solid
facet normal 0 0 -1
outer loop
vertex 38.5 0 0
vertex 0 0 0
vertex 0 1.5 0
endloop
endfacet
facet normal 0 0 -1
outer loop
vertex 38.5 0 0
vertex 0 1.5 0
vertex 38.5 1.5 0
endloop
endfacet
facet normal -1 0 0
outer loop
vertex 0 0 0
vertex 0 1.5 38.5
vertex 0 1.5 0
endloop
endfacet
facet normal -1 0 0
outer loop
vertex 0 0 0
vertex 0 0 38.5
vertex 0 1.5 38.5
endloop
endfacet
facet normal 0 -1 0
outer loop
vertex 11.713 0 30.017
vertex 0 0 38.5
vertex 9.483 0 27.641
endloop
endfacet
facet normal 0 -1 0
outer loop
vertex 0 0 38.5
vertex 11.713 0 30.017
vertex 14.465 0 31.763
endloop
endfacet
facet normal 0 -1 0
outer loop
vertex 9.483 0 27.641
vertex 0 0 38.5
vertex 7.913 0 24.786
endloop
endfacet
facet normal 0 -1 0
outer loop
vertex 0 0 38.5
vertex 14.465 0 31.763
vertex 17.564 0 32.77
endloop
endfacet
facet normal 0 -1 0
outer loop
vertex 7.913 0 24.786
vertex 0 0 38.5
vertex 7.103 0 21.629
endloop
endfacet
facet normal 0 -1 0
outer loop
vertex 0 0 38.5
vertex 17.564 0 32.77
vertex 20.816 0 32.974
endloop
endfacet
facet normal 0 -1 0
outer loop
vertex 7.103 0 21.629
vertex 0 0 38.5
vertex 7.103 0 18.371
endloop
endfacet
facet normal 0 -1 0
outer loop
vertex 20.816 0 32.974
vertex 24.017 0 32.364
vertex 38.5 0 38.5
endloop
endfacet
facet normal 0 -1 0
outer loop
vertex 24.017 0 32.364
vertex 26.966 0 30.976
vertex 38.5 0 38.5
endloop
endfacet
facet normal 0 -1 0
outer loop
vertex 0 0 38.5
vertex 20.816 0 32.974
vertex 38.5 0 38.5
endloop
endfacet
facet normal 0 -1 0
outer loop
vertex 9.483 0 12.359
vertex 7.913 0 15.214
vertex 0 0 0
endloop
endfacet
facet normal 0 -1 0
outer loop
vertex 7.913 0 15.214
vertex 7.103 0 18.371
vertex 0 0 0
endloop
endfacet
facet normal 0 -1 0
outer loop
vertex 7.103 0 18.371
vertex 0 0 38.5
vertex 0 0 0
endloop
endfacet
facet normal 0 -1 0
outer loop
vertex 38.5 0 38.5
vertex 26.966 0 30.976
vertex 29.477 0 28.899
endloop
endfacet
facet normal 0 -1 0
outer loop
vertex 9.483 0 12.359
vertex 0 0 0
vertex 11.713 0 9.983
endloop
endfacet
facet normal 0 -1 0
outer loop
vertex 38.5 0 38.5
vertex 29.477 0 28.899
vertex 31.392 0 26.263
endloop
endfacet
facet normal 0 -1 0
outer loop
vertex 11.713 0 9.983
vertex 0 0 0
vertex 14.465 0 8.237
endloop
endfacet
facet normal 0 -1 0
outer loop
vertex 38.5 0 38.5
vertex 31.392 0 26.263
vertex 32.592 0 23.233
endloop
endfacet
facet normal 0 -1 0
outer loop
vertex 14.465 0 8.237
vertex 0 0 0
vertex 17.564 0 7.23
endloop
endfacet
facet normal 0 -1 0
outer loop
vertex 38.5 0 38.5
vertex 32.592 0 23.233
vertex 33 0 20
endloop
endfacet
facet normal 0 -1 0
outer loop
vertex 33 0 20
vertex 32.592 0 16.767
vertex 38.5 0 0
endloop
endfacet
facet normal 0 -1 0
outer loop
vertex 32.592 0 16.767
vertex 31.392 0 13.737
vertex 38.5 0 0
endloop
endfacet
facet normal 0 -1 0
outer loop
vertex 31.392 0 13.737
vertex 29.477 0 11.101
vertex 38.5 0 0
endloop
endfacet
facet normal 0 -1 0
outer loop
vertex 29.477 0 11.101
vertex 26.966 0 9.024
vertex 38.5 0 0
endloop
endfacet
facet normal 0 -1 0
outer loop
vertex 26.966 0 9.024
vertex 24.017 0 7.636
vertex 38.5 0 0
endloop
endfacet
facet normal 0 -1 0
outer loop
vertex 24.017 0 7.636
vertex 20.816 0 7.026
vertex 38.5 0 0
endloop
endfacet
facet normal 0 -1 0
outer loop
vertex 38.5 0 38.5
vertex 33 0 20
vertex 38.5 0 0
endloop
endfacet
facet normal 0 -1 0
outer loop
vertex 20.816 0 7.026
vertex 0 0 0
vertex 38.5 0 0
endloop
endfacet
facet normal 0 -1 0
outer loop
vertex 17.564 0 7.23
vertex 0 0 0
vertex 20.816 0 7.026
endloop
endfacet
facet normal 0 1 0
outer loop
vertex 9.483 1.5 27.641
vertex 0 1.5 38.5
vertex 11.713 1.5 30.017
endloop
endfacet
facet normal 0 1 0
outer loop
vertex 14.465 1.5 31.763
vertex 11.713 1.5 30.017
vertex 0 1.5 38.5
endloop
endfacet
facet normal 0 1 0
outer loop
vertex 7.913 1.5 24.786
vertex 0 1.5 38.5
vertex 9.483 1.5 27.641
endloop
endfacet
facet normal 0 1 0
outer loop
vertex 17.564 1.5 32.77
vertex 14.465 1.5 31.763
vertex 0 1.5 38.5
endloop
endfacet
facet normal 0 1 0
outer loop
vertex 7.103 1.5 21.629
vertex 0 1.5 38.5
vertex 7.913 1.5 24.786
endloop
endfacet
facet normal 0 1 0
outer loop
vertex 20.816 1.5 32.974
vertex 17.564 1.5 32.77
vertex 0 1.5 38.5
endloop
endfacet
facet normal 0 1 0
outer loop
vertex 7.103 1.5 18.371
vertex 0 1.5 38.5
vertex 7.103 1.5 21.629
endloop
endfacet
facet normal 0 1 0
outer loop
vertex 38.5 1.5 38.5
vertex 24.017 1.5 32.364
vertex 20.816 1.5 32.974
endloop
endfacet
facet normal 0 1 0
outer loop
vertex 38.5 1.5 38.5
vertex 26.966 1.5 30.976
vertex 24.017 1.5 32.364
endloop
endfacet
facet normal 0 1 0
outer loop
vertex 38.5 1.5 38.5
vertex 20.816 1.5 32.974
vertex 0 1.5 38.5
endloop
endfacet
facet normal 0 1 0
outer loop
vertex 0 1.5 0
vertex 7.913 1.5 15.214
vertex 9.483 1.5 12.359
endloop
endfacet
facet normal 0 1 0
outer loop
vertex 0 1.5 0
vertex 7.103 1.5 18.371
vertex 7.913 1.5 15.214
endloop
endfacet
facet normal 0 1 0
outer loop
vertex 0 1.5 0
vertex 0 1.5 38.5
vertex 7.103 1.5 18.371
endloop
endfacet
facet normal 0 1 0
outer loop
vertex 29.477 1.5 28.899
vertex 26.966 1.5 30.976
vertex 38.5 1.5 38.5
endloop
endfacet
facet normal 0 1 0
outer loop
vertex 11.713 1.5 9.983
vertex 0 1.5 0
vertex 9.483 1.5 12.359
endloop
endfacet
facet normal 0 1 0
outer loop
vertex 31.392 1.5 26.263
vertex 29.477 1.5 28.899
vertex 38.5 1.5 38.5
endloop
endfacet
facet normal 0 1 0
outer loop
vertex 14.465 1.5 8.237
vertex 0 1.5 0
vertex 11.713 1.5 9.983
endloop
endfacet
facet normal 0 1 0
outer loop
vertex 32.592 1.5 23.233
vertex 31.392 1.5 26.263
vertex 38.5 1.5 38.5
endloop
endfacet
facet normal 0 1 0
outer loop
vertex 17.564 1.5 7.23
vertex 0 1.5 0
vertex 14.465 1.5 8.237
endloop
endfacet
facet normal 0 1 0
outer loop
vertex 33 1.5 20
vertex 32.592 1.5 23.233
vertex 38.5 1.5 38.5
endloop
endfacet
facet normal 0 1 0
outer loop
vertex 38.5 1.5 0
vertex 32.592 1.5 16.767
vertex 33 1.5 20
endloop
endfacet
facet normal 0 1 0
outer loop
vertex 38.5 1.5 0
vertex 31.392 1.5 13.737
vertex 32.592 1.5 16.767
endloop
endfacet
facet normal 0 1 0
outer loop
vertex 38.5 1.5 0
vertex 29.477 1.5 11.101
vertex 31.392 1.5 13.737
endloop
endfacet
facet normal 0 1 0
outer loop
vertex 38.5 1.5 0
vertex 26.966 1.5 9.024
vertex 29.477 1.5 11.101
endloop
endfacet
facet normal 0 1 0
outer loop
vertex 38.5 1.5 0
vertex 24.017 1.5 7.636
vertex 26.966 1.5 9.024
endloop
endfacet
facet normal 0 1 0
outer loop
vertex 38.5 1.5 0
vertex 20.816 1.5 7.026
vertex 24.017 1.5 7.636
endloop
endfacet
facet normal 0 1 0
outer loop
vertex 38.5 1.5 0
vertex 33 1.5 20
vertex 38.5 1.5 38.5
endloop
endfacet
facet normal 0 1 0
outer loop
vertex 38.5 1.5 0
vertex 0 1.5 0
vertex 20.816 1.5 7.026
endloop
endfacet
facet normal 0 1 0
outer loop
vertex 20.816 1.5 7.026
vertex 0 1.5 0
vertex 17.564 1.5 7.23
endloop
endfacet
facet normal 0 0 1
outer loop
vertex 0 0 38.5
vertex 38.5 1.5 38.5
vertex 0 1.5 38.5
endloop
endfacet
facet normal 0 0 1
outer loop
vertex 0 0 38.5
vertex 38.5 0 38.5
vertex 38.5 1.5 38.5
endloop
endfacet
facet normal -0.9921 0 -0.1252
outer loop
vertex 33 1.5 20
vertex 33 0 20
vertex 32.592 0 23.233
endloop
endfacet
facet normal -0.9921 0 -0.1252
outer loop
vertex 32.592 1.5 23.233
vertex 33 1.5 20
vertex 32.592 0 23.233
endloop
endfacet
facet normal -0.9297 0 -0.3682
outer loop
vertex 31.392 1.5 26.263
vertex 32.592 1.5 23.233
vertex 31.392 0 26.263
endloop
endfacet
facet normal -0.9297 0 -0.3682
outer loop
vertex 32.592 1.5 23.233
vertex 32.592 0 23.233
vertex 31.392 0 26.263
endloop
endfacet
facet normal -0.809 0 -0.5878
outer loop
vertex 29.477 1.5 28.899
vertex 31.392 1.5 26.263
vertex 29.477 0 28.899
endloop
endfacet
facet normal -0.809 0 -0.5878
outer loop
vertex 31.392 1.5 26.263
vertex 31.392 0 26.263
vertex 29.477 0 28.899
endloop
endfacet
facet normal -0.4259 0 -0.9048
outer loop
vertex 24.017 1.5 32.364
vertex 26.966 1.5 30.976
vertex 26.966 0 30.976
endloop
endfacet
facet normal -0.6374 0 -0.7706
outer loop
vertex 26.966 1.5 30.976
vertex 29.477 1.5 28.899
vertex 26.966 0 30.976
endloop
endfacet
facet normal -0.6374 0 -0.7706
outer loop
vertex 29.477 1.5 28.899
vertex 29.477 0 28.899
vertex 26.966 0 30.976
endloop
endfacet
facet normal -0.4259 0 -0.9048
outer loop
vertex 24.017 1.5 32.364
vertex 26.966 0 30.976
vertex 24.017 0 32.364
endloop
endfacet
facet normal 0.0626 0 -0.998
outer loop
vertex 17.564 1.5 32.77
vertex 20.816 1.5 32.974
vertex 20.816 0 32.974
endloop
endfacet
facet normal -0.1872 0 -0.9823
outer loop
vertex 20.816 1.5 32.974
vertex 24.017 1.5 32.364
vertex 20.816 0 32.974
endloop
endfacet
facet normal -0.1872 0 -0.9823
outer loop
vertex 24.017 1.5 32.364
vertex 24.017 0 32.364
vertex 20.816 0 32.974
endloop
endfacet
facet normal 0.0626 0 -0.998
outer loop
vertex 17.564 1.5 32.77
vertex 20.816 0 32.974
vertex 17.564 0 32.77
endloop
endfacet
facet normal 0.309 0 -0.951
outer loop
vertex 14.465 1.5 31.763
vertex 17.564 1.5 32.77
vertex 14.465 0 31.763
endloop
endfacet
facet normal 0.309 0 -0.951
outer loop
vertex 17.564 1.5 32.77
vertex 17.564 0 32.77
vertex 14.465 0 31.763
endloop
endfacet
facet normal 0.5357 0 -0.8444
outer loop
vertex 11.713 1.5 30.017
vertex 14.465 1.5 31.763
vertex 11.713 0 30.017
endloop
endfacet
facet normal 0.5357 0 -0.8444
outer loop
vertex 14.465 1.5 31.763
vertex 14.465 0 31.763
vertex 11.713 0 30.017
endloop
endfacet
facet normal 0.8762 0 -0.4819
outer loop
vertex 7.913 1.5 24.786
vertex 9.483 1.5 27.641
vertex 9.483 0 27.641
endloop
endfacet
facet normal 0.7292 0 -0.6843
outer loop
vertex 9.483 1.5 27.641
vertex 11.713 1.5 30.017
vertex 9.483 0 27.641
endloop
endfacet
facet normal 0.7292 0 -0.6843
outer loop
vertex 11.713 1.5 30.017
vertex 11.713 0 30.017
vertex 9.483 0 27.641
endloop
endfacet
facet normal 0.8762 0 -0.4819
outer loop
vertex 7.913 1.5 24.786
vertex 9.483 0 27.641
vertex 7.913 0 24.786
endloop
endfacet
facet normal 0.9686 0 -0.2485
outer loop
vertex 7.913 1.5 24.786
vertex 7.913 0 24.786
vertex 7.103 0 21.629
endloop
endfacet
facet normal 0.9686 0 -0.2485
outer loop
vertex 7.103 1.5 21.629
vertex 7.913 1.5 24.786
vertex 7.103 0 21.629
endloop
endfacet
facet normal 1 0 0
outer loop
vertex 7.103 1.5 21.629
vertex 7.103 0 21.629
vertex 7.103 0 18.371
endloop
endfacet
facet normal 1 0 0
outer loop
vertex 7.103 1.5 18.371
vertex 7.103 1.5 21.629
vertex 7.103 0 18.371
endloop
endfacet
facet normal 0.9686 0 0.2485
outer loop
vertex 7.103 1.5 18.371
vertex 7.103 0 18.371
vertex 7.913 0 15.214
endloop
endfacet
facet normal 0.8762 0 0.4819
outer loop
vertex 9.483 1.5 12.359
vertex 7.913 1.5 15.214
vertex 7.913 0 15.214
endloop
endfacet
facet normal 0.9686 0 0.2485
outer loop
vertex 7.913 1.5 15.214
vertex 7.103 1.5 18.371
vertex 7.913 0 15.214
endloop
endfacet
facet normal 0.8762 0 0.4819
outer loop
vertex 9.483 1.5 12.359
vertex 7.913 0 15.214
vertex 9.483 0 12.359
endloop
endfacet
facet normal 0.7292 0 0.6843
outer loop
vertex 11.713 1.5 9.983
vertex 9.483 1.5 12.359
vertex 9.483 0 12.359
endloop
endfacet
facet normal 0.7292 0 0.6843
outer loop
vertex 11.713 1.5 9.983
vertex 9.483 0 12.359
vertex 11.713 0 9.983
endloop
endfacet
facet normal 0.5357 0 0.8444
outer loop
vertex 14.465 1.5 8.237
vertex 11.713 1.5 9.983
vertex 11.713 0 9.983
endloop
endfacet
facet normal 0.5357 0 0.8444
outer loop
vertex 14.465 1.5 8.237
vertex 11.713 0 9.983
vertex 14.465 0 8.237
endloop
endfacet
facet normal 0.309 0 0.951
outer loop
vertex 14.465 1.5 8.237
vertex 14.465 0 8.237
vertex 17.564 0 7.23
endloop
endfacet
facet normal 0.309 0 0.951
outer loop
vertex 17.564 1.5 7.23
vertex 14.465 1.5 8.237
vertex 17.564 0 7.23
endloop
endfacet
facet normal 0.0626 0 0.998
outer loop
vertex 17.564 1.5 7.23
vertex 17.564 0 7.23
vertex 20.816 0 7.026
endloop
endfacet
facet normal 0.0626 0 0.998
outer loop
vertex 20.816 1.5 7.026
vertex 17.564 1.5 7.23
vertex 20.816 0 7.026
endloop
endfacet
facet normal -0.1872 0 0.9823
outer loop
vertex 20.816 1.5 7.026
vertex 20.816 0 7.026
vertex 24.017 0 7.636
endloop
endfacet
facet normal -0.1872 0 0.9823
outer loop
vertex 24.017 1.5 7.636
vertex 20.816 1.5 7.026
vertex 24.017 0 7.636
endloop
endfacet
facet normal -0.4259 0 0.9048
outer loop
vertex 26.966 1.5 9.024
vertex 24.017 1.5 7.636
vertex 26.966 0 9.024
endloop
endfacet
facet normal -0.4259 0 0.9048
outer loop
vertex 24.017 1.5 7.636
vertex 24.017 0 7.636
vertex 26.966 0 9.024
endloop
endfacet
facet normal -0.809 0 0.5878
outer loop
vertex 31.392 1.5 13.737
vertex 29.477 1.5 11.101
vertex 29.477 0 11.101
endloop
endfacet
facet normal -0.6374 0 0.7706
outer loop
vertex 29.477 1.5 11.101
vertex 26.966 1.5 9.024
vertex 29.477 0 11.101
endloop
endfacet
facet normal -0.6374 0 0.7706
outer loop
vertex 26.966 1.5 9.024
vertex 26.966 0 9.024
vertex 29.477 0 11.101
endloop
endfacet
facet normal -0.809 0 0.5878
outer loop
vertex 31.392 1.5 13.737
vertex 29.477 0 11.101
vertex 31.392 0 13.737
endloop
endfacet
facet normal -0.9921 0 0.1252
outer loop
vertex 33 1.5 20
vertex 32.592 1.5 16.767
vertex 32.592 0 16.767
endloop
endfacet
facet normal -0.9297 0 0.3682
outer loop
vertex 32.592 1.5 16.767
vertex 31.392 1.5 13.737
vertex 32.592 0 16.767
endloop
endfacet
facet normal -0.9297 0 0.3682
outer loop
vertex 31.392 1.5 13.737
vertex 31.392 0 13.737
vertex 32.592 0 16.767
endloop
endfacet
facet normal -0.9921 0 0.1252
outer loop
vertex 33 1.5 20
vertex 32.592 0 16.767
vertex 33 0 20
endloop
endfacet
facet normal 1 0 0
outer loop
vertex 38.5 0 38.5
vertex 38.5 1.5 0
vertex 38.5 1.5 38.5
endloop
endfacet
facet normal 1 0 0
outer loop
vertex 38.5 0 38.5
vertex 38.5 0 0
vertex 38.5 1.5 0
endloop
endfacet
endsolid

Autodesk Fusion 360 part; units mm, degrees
sketch "Sketch1" plane through (0, 0, 0) normal (0, 1, 0) x (1, 0, 0)
  line L0 (0, 0) -> (38.5, 0)
  line L1 (38.5, 0) -> (38.5, -38.5)
  line L2 (38.5, -38.5) -> (0, -38.5)
  line L3 (0, -38.5) -> (0, 0)
  circle A0 centre (20, -20) radius 13
  dimension "d1" = 38.5
  dimension "d2" = 38.5
  dimension "d3" = 26
extrude "Extrude1" add sketch "Sketch1" along normal blind 1.5
